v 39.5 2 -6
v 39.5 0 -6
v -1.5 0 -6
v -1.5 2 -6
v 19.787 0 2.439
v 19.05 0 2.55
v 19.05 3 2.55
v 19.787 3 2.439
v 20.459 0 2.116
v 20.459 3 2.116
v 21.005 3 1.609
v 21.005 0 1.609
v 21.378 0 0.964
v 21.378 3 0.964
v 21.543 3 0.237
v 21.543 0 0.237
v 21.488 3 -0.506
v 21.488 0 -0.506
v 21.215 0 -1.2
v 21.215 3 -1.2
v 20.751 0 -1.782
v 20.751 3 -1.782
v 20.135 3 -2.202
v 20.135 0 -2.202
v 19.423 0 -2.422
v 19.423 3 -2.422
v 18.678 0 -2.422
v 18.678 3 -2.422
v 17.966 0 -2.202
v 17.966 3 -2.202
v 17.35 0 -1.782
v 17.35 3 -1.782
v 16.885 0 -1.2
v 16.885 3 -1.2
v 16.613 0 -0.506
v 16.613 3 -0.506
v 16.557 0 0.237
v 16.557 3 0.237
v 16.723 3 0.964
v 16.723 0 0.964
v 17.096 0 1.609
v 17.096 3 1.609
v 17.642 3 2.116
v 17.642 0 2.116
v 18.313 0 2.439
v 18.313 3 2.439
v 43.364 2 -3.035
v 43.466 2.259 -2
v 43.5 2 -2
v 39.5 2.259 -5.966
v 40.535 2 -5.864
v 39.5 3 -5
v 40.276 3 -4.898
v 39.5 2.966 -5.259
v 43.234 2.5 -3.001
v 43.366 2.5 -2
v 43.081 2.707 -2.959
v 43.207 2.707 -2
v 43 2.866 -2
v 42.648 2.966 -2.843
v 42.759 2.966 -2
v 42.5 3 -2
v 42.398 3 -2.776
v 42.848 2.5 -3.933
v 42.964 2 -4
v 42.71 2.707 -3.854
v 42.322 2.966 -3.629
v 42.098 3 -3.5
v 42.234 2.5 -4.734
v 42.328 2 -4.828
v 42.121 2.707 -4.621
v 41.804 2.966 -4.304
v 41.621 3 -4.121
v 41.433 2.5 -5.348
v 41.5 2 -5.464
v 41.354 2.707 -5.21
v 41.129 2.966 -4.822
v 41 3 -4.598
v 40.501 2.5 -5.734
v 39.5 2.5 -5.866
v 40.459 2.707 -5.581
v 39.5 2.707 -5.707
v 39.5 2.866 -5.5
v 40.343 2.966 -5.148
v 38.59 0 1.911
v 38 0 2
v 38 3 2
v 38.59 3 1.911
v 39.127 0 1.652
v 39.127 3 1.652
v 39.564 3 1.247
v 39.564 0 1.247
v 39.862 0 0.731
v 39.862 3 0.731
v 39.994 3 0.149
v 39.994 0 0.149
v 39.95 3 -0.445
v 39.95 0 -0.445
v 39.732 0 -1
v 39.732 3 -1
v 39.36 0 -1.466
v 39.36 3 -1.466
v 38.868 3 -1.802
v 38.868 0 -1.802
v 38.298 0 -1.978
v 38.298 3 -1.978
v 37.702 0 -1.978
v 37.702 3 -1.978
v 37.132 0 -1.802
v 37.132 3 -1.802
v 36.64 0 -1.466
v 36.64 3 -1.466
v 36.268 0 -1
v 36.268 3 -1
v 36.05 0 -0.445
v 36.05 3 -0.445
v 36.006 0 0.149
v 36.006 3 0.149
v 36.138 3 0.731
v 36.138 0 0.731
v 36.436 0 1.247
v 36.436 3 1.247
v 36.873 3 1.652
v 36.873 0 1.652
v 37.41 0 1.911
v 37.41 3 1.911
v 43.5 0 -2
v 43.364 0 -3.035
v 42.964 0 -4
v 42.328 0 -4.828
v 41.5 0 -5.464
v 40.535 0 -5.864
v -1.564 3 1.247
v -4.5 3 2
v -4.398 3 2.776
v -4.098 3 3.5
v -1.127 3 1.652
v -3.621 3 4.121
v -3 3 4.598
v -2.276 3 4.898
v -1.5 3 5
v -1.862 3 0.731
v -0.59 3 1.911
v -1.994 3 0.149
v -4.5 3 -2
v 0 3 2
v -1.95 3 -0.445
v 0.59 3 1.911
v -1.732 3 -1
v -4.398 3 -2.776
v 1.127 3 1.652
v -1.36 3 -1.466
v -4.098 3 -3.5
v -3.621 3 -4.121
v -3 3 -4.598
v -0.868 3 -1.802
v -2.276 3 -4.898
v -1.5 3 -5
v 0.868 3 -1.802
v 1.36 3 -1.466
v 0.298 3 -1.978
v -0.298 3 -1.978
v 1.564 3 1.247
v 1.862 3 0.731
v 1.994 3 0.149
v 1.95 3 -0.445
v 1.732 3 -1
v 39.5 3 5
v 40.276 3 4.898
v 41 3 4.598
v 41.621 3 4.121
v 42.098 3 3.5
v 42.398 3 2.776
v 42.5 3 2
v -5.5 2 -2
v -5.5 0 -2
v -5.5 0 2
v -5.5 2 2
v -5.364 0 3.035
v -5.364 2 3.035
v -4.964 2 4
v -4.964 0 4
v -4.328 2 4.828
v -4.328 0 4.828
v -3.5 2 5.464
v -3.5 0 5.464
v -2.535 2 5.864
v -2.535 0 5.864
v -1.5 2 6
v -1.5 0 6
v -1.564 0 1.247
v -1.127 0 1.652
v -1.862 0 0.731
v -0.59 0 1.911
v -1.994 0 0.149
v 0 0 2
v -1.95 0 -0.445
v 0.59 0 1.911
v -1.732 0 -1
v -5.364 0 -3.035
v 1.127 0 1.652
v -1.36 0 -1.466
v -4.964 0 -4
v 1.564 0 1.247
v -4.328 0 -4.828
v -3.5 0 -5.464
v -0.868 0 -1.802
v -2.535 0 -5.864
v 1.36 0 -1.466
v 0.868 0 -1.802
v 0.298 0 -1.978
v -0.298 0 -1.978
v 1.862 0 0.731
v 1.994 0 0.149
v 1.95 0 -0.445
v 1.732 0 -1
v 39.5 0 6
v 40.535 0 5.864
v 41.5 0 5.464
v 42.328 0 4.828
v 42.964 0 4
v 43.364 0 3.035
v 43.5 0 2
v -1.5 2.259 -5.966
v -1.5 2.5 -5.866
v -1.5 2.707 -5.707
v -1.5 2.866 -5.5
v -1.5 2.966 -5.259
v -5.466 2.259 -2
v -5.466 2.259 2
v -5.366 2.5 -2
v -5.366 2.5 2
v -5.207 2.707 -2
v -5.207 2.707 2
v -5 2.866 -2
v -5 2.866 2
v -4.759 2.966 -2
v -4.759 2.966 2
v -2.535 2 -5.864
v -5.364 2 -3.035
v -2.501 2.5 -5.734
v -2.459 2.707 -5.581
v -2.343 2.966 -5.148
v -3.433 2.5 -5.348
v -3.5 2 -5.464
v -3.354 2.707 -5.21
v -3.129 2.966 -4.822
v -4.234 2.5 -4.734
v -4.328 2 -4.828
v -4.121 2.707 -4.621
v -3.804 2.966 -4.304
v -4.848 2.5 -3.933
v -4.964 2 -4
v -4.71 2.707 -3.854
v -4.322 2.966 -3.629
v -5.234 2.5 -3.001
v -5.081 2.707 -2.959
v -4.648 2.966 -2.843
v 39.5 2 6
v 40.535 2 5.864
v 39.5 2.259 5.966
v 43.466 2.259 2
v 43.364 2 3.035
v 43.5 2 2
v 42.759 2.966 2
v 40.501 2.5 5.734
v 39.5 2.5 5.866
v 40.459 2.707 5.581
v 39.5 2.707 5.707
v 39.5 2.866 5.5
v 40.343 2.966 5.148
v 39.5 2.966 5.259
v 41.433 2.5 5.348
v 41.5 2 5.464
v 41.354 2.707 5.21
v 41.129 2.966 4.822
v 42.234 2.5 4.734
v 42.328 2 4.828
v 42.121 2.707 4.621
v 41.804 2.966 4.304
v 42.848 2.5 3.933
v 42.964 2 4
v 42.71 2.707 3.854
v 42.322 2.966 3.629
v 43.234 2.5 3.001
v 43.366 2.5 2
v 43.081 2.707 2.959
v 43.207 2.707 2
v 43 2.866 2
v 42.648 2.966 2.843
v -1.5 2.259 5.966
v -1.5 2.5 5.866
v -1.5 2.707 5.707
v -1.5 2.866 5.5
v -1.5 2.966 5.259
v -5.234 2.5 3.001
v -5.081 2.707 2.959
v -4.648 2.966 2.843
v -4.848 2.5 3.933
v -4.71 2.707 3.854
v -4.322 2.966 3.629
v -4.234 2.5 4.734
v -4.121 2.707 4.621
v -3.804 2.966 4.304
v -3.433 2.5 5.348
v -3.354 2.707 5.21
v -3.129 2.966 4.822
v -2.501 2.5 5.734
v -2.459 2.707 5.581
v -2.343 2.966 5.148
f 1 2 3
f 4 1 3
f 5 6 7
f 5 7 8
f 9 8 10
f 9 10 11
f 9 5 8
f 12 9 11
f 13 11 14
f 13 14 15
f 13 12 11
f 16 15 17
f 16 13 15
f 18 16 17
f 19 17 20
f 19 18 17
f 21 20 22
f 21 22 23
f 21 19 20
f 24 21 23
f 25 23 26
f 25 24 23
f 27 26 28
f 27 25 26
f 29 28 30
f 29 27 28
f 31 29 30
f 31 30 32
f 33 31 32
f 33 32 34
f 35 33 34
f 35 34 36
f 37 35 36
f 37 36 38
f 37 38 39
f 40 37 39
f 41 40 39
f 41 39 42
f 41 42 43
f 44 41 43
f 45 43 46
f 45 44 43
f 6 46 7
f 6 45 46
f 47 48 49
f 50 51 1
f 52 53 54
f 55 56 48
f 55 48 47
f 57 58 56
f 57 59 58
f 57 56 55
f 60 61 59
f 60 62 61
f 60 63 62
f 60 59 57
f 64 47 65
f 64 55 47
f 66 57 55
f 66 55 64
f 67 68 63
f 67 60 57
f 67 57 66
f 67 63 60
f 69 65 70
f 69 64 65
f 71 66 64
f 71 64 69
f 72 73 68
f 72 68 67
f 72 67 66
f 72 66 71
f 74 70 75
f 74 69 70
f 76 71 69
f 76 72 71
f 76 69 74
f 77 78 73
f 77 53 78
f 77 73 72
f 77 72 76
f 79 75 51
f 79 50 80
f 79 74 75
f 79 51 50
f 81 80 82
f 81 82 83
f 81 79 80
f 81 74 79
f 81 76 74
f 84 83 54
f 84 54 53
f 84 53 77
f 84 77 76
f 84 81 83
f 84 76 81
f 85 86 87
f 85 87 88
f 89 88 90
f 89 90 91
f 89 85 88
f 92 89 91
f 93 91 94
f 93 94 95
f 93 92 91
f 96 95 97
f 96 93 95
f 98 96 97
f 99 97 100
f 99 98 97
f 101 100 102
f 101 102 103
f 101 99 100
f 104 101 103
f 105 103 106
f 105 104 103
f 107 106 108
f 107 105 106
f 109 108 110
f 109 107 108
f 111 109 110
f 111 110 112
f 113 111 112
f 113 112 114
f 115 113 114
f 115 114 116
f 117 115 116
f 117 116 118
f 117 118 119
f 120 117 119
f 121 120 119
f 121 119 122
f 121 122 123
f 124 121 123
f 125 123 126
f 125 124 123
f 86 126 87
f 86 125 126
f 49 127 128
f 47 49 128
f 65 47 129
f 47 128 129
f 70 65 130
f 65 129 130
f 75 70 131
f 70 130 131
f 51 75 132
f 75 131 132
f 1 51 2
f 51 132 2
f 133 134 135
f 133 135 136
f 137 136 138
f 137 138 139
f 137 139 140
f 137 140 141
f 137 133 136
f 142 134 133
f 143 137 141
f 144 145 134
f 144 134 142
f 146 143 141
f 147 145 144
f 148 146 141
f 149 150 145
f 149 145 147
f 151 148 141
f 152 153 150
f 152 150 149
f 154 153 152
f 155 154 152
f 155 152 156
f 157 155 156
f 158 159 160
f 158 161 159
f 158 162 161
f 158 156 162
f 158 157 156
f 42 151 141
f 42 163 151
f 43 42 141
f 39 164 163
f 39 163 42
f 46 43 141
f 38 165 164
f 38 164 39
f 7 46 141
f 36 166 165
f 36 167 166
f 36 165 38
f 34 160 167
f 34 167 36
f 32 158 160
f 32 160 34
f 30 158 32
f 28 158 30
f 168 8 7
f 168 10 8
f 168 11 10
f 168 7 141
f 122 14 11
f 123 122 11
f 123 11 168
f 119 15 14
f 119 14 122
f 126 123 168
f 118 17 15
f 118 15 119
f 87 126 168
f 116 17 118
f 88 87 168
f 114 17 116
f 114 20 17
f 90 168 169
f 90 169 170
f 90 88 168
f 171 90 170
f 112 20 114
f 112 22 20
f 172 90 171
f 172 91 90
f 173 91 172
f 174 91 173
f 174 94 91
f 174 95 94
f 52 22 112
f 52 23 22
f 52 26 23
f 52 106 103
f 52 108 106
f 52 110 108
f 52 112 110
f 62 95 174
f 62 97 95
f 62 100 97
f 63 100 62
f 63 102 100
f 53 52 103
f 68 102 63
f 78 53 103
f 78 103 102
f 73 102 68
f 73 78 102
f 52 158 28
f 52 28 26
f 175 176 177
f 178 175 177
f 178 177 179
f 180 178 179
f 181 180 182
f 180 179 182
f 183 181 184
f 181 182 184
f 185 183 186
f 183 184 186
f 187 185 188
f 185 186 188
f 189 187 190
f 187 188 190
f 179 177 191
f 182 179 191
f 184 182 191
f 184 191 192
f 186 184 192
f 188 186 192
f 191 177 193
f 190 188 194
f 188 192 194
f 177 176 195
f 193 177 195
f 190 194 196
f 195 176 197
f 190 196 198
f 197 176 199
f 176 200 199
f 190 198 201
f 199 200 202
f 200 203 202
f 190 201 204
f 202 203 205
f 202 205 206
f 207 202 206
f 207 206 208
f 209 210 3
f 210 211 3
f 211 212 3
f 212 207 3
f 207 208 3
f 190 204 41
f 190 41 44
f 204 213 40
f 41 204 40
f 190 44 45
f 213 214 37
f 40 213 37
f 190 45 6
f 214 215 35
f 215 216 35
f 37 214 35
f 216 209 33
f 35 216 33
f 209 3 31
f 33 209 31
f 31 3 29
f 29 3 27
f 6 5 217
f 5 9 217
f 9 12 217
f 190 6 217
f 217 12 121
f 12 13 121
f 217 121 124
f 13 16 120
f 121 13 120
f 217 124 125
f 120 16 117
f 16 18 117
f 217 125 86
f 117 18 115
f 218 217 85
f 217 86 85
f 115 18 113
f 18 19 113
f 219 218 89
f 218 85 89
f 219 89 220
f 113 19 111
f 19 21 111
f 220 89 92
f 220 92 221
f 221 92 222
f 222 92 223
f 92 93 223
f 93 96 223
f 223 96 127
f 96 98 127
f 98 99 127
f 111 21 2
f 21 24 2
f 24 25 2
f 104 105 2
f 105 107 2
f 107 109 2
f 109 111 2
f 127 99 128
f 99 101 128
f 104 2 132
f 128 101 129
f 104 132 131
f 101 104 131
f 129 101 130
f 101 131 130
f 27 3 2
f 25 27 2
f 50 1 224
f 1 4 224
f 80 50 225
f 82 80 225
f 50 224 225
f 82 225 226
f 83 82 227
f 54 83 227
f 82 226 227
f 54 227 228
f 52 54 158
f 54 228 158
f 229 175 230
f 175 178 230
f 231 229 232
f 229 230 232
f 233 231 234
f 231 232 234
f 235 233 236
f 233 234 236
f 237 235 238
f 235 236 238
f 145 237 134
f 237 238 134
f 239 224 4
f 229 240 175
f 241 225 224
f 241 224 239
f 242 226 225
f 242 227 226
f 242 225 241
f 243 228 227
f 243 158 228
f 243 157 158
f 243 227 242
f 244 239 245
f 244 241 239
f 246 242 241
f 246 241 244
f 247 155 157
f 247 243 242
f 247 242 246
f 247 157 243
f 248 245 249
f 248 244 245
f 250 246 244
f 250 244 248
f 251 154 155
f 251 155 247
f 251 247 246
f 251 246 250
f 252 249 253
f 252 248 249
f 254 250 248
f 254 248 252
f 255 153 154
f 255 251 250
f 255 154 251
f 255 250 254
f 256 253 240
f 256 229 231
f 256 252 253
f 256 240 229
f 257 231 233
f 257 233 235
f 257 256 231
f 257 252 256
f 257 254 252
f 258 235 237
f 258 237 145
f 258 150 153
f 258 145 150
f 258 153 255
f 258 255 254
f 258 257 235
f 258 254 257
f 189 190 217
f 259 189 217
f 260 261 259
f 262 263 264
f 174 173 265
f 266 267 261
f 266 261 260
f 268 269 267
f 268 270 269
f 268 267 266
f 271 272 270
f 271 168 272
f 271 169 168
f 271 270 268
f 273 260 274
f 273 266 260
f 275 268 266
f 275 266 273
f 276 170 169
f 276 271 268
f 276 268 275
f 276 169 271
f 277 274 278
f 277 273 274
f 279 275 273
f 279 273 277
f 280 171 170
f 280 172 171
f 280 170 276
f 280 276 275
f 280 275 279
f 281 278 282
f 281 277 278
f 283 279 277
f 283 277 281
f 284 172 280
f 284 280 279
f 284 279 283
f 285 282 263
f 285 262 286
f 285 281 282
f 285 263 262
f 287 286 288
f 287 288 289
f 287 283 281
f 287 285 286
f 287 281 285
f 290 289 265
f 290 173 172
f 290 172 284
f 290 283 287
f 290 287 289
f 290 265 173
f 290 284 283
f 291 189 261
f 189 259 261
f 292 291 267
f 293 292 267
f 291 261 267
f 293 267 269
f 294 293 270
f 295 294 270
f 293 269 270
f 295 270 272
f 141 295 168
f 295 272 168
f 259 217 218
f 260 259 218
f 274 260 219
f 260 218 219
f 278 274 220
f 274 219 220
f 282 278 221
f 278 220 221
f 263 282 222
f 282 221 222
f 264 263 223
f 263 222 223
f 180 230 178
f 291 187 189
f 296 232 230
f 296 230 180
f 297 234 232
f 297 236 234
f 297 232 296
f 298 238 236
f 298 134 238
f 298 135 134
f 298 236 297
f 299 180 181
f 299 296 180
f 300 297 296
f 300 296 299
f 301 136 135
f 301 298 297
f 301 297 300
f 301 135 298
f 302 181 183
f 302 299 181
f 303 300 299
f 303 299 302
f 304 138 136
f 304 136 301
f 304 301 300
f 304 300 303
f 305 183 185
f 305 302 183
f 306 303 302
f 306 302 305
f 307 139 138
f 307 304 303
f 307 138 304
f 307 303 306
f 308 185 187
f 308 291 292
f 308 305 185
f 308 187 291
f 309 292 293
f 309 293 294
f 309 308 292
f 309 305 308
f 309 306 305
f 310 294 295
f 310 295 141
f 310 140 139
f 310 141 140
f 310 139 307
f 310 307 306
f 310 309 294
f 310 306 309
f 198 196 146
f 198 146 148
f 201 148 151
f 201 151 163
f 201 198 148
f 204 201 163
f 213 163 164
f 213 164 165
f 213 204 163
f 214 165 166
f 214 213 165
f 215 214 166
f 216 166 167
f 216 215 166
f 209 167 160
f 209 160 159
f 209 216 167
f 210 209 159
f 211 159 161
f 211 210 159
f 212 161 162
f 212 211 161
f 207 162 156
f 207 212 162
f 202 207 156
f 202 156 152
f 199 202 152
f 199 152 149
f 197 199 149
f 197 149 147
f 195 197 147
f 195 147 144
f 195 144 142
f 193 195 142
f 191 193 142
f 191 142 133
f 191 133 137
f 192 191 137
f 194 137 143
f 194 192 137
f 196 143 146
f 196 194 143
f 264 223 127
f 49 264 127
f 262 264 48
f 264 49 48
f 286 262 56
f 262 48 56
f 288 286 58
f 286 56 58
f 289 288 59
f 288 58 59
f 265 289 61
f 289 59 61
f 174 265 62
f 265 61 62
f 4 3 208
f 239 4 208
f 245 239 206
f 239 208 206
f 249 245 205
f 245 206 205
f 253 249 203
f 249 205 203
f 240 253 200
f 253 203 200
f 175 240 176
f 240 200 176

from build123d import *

# Parameters (mm, degrees)
SKETCH1_R           = 2
SKETCH1_R_2         = 2.5
BOSS_EXTRUDE1_DEPTH = 3
FILLET1_R           = 1


with BuildPart() as part:
    # Sketch1 → Boss-Extrude1 (new body)
    with BuildSketch(Plane(origin=(0, 0, 0), x_dir=(1, 0, 0), z_dir=(0, 1, 0))):
        with BuildLine():
            Line((-5.5, 2), (-5.5, -2))
            ThreePointArc((-5.5, -2), (-4.328427125, -4.828427125), (-1.5, -6))
            Line((-1.5, -6), (39.5, -6))
            ThreePointArc((39.5, -6), (42.328427125, -4.828427125), (43.5, -2))
            Line((43.5, -2), (43.5, 2))
            ThreePointArc((43.5, 2), (42.328427125, 4.828427125), (39.5, 6))
            Line((39.5, 6), (-1.5, 6))
            ThreePointArc((-1.5, 6), (-4.328427125, 4.828427125), (-5.5, 2))
        make_face()
        with Locations(Location((0, 0, 0), (0, 0, 270))):
            Circle(SKETCH1_R, mode=Mode.SUBTRACT)
        with Locations(Location((38, 0, 0), (0, 0, 270))):
            Circle(SKETCH1_R, mode=Mode.SUBTRACT)
        with Locations(Location((19.050336346, -0.050336346, 0), (0, 0, 270))):
            Circle(SKETCH1_R_2, mode=Mode.SUBTRACT)
    extrude(amount=BOSS_EXTRUDE1_DEPTH)

    # Fillet1
    fillet1_edges = [part.edges().sort_by_distance(p)[0] for p in [
        (-4.328427125, 3, -4.828427125),
        (-5.5, 3, 0),
        (-4.328427125, 3, 4.828427125),
        (19, 3, 6),
        (42.328427125, 3, 4.828427125),
        (43.5, 3, 0),
        (42.328427125, 3, -4.828427125),
        (19, 3, -6),
    ]]
    fillet(fillet1_edges, radius=FILLET1_R)


solid = part.part
